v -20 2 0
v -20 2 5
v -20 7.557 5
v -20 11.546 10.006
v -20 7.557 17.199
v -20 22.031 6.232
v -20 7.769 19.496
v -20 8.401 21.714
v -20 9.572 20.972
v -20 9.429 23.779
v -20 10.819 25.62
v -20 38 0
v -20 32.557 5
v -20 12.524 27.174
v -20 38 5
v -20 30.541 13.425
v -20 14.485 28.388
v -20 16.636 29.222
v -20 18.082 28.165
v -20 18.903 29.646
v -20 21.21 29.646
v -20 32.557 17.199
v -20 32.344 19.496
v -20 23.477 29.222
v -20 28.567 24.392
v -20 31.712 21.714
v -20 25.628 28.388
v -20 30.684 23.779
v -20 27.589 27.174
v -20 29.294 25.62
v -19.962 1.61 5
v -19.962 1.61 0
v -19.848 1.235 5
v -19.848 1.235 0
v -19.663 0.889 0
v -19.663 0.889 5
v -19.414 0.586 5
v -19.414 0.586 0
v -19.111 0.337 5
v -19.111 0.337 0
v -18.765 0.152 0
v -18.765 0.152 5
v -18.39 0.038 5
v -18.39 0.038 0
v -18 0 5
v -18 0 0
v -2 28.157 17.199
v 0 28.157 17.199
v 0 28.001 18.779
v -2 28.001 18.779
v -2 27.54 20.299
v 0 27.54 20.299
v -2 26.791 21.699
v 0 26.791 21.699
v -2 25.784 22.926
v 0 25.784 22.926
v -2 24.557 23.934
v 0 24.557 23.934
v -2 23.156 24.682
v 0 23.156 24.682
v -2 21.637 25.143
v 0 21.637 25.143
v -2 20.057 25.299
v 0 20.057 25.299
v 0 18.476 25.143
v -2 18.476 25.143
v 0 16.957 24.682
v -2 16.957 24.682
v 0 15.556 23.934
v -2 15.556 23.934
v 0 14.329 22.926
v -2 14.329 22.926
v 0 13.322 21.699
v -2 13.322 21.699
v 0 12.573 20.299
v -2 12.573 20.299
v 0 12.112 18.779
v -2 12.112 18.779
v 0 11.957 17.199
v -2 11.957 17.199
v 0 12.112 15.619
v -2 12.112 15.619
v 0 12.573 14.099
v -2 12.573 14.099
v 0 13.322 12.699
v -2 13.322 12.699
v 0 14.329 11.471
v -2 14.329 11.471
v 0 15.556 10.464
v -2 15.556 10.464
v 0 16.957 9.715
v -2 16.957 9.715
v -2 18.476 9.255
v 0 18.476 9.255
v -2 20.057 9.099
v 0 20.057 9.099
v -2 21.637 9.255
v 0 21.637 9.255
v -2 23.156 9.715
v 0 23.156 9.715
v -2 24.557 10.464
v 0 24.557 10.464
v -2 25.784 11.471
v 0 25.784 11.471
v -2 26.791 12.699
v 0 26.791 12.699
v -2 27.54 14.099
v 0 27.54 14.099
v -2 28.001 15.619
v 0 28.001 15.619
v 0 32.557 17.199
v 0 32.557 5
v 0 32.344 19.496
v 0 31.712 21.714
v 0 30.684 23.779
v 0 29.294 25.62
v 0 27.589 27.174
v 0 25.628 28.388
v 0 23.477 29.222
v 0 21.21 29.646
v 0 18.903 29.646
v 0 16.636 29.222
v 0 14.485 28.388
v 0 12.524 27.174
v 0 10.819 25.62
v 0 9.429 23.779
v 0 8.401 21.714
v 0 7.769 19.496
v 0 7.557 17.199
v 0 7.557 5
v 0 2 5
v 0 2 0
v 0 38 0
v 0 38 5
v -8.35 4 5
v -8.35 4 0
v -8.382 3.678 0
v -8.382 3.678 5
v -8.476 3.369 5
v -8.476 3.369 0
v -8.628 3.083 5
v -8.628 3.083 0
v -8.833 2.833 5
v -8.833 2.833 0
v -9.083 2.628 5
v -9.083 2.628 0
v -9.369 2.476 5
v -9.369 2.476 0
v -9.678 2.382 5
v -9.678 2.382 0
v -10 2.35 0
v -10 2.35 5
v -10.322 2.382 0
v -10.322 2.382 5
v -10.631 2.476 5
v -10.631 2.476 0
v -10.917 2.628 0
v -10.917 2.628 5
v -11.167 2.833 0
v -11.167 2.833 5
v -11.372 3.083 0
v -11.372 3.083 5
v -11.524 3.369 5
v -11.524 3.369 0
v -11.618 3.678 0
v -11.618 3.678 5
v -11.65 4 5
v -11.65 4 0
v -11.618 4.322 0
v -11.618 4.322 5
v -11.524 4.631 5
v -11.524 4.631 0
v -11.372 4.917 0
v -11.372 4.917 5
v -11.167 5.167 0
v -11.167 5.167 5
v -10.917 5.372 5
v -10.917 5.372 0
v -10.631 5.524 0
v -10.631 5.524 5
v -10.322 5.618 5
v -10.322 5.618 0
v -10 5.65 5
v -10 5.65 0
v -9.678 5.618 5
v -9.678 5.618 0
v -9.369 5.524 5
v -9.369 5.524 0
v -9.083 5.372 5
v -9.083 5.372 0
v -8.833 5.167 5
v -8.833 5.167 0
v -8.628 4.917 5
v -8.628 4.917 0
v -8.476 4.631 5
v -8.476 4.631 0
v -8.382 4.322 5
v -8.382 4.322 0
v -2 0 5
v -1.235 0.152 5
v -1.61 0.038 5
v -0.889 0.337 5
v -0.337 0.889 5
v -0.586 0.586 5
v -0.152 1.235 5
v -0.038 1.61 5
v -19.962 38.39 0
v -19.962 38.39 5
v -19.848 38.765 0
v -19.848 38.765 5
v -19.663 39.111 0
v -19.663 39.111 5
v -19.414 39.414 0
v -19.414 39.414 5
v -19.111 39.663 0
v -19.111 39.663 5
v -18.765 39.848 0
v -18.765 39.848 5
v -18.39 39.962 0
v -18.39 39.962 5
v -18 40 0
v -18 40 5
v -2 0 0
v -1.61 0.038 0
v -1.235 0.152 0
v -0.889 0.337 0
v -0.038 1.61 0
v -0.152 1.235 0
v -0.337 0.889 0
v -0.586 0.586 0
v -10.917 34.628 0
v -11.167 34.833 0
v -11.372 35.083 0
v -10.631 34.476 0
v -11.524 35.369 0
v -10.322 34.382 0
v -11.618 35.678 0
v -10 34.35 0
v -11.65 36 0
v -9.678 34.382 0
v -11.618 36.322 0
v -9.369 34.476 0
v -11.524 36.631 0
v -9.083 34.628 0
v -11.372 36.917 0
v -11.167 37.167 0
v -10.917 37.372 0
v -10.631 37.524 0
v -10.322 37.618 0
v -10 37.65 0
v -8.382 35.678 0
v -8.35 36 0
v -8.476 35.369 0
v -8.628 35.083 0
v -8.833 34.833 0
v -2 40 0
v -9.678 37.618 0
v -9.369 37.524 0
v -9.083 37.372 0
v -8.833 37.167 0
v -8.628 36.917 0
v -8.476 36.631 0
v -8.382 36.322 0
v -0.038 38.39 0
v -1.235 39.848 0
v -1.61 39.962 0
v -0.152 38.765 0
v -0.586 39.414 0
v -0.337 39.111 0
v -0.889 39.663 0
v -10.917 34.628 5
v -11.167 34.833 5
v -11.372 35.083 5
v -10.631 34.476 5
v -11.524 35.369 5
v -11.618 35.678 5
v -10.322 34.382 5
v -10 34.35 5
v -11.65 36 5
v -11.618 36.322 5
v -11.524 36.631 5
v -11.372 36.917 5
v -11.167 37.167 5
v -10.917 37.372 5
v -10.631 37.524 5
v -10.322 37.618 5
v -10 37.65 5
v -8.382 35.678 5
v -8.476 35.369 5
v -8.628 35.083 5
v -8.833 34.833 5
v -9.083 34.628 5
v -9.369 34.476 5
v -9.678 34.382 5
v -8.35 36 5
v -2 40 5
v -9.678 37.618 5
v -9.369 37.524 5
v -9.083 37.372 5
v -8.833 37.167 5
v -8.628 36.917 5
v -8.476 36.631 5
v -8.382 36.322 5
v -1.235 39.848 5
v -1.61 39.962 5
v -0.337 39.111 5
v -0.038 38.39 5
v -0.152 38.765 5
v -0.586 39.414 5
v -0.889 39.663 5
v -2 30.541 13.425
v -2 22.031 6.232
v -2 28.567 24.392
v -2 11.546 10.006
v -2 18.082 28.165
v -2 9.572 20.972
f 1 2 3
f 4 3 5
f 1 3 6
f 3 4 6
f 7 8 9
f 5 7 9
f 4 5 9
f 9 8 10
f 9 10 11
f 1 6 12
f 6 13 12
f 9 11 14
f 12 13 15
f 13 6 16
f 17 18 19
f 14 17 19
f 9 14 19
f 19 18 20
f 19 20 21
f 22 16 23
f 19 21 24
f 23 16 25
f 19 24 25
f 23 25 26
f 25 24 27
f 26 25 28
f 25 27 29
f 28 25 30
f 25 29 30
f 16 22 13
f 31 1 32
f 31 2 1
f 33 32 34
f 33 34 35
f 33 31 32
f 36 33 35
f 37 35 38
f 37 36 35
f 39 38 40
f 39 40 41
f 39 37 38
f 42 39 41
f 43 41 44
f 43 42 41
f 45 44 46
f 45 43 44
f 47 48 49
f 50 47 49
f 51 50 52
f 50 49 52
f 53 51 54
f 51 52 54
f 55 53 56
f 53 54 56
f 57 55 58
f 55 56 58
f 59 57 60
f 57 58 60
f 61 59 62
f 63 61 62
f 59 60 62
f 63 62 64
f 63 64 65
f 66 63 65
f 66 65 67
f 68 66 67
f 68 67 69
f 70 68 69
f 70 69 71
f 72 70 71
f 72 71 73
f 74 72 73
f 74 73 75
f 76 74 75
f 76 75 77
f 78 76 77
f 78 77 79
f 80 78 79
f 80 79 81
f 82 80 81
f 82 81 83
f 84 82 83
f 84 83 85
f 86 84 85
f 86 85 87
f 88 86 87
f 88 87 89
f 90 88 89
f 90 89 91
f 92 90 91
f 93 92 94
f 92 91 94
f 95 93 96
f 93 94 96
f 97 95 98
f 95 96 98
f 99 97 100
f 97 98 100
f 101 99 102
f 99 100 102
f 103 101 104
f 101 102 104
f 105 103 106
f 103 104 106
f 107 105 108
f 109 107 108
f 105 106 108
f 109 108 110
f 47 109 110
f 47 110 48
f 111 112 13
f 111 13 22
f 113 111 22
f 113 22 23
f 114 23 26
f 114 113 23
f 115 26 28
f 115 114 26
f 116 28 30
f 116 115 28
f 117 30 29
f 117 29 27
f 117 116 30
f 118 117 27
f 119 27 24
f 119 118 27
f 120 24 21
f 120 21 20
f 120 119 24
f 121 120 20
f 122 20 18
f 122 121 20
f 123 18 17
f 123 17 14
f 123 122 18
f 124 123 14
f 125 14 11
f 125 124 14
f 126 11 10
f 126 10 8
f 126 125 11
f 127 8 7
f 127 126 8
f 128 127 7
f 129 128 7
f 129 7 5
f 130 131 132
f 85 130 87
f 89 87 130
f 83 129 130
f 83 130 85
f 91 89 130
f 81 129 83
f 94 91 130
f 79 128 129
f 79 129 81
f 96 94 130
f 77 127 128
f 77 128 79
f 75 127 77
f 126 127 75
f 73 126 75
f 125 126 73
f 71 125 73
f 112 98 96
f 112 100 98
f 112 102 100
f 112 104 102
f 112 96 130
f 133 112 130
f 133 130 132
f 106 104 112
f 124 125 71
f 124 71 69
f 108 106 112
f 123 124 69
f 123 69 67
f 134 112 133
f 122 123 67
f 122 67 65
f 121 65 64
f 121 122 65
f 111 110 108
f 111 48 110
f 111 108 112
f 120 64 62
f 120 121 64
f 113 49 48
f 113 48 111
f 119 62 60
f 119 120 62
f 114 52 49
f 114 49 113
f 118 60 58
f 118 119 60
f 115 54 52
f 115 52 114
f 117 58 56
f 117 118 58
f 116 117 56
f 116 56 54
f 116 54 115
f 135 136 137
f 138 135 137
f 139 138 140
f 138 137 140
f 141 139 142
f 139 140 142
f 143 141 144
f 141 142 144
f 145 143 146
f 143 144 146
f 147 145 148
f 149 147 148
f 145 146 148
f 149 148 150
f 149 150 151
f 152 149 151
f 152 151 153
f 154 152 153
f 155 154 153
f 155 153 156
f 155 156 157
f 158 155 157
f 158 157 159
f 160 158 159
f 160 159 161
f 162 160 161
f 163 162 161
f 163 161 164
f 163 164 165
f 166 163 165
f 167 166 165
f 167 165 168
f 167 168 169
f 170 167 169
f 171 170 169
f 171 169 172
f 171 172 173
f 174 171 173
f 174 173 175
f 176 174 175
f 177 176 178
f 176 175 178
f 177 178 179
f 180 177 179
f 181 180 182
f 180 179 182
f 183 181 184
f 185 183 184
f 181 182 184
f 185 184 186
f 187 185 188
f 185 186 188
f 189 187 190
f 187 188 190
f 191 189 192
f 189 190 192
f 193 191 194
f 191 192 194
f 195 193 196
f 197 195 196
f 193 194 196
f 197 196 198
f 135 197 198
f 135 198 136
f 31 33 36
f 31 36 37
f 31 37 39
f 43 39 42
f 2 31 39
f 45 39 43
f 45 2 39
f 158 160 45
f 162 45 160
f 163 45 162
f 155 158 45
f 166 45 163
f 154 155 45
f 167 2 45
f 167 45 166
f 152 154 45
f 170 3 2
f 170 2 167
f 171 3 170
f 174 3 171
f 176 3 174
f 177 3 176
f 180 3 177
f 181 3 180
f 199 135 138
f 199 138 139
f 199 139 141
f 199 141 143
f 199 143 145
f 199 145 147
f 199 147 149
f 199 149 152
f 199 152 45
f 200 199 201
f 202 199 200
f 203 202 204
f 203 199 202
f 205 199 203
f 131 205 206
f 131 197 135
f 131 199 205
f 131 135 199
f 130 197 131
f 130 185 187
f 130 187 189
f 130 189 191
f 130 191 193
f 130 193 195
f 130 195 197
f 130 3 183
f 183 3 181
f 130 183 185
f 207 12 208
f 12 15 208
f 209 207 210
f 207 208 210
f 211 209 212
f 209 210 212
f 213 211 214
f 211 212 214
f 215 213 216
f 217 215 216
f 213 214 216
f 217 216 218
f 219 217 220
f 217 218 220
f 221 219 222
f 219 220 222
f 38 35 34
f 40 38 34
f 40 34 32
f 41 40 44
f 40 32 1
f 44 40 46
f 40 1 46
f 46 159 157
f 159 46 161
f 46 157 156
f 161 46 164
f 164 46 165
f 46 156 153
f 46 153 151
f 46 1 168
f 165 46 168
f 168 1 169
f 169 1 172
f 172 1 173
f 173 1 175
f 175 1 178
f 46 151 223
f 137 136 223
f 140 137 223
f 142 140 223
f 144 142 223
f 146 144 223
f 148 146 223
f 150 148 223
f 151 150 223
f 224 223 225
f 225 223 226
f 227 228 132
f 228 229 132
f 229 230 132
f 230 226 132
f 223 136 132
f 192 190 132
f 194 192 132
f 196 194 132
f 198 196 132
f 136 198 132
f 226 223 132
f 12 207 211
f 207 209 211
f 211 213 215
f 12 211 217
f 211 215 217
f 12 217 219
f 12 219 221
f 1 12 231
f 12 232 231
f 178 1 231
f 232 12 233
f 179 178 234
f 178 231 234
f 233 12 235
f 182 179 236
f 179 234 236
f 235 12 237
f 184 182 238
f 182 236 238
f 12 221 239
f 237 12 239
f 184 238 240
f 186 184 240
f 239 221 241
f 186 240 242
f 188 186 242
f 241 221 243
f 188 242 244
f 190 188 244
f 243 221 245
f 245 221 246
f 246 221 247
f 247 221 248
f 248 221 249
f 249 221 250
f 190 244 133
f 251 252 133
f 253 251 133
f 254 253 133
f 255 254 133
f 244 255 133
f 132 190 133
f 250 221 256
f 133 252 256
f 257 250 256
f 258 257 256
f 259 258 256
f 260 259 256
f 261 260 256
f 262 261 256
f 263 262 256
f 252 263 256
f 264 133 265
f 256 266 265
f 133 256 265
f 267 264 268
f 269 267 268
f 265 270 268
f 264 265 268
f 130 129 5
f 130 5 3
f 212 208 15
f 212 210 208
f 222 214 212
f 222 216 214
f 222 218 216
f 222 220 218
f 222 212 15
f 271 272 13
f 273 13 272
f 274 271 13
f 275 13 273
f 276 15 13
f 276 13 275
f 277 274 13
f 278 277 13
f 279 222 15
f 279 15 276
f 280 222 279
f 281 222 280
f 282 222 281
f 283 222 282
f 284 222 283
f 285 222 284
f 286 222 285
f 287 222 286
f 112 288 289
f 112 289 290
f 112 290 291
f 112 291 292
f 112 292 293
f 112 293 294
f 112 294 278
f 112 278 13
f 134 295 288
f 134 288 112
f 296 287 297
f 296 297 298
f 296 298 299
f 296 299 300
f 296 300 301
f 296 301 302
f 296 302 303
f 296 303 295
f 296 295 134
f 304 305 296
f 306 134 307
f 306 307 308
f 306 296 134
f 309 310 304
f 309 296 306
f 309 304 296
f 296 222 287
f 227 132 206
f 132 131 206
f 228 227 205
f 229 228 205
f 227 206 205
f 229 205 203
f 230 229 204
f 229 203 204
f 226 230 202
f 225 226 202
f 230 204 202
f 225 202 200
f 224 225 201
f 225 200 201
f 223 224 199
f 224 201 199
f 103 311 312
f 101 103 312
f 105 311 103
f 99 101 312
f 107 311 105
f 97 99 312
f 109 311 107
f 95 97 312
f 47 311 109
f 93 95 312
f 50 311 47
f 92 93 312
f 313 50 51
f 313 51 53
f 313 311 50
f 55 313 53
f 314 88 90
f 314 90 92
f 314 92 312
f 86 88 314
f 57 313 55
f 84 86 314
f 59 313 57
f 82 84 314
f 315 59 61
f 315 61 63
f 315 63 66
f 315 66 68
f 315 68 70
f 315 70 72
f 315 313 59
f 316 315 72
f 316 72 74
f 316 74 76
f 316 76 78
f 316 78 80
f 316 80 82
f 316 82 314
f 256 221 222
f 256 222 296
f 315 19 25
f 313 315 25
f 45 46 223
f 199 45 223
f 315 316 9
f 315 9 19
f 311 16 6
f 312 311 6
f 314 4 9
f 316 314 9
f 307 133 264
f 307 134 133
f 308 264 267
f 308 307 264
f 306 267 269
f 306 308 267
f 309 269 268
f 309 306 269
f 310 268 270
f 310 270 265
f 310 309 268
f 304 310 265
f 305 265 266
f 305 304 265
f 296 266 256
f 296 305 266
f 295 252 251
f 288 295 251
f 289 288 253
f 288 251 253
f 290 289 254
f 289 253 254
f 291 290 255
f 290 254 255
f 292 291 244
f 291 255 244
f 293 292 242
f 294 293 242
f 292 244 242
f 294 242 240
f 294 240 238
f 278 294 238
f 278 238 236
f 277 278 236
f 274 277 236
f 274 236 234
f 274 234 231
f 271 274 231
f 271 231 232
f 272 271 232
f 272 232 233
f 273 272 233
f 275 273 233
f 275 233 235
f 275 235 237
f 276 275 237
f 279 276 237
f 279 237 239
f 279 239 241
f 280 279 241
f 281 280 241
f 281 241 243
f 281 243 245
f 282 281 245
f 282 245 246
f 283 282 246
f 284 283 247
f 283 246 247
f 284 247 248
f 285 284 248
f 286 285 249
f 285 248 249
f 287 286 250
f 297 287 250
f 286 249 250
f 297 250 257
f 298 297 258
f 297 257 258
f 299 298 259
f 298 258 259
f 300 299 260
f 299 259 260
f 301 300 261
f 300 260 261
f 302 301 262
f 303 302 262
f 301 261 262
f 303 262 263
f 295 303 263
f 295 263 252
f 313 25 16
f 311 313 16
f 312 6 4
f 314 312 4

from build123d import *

# Parameters (mm, degrees)
F0_W     = 20
F0_H     = 40
F1_DEPTH = 5
F2_R     = 8.1
F3_DEPTH = 20
F5_DEPTH = 18
F6_R     = 1.65
F7_DEPTH = 29.699904
F8_R     = 2


with BuildPart() as f1:
    # F0 (on Top) → F1 (new body)
    with BuildSketch(Plane.XY):
        with Locations((-10, 20)):
            Rectangle(F0_W, F0_H)
    extrude(amount=F1_DEPTH)

    # F2 (on Right) → F3 (join)
    with BuildSketch(Plane.YZ):
        with BuildLine():
            ThreePointArc((7.556538, 17.198904), (20.056538, 4.698904), (32.556538, 17.198904))
            ThreePointArc((32.556538, 17.198904), (20.056538, 29.698904), (7.556538, 17.198904))
        make_face()
        with Locations((20.056538, 17.198904)):
            Circle(F2_R, mode=Mode.SUBTRACT)
        with BuildLine():
            Line((32.556538, 4.106051), (32.556538, 17.198904))
            ThreePointArc((32.556538, 17.198904), (20.056538, 4.698904), (7.556538, 17.198904))
            Line((7.556538, 17.198904), (7.556538, 4.106051))
            Line((7.556538, 4.106051), (32.340245, 4.106051))
            Line((32.340245, 4.106051), (32.556538, 4.106051))
        make_face()
    extrude(amount=-F3_DEPTH)

    # F4 (on face) → F5 (cut)
    with BuildSketch(Plane(origin=(-20, 0, 0), x_dir=(0, -1, 0), z_dir=(-1, 0, 0))):
        Polygon((-30.540984, 13.425348), (-22.030766, 6.232329), (-11.546319, 10.005885), (-9.572091, 20.97246), (-18.08231, 28.165478), (-28.566756, 24.391923), align=None)
    extrude(amount=-F5_DEPTH, mode=Mode.SUBTRACT)

    # F6 (on face) → F7 (cut, through all)
    with BuildSketch(Plane(origin=(0, 0, 0), x_dir=(1, 0, 0), z_dir=(0, 0, -1))):
        with Locations((-10, -4)):
            Circle(F6_R)
        with Locations((-10, -36)):
            Circle(F6_R)
    extrude(amount=-F7_DEPTH, mode=Mode.SUBTRACT)

    # F8
    f8_edges = [f1.edges().sort_by_distance(p)[0] for p in [
        (-20, 40, 2.5),
        (0, 40, 2.5),
        (0, 0, 2.5),
        (-20, 0, 2.5),
    ]]
    fillet(f8_edges, radius=F8_R)


solid = f1.part
